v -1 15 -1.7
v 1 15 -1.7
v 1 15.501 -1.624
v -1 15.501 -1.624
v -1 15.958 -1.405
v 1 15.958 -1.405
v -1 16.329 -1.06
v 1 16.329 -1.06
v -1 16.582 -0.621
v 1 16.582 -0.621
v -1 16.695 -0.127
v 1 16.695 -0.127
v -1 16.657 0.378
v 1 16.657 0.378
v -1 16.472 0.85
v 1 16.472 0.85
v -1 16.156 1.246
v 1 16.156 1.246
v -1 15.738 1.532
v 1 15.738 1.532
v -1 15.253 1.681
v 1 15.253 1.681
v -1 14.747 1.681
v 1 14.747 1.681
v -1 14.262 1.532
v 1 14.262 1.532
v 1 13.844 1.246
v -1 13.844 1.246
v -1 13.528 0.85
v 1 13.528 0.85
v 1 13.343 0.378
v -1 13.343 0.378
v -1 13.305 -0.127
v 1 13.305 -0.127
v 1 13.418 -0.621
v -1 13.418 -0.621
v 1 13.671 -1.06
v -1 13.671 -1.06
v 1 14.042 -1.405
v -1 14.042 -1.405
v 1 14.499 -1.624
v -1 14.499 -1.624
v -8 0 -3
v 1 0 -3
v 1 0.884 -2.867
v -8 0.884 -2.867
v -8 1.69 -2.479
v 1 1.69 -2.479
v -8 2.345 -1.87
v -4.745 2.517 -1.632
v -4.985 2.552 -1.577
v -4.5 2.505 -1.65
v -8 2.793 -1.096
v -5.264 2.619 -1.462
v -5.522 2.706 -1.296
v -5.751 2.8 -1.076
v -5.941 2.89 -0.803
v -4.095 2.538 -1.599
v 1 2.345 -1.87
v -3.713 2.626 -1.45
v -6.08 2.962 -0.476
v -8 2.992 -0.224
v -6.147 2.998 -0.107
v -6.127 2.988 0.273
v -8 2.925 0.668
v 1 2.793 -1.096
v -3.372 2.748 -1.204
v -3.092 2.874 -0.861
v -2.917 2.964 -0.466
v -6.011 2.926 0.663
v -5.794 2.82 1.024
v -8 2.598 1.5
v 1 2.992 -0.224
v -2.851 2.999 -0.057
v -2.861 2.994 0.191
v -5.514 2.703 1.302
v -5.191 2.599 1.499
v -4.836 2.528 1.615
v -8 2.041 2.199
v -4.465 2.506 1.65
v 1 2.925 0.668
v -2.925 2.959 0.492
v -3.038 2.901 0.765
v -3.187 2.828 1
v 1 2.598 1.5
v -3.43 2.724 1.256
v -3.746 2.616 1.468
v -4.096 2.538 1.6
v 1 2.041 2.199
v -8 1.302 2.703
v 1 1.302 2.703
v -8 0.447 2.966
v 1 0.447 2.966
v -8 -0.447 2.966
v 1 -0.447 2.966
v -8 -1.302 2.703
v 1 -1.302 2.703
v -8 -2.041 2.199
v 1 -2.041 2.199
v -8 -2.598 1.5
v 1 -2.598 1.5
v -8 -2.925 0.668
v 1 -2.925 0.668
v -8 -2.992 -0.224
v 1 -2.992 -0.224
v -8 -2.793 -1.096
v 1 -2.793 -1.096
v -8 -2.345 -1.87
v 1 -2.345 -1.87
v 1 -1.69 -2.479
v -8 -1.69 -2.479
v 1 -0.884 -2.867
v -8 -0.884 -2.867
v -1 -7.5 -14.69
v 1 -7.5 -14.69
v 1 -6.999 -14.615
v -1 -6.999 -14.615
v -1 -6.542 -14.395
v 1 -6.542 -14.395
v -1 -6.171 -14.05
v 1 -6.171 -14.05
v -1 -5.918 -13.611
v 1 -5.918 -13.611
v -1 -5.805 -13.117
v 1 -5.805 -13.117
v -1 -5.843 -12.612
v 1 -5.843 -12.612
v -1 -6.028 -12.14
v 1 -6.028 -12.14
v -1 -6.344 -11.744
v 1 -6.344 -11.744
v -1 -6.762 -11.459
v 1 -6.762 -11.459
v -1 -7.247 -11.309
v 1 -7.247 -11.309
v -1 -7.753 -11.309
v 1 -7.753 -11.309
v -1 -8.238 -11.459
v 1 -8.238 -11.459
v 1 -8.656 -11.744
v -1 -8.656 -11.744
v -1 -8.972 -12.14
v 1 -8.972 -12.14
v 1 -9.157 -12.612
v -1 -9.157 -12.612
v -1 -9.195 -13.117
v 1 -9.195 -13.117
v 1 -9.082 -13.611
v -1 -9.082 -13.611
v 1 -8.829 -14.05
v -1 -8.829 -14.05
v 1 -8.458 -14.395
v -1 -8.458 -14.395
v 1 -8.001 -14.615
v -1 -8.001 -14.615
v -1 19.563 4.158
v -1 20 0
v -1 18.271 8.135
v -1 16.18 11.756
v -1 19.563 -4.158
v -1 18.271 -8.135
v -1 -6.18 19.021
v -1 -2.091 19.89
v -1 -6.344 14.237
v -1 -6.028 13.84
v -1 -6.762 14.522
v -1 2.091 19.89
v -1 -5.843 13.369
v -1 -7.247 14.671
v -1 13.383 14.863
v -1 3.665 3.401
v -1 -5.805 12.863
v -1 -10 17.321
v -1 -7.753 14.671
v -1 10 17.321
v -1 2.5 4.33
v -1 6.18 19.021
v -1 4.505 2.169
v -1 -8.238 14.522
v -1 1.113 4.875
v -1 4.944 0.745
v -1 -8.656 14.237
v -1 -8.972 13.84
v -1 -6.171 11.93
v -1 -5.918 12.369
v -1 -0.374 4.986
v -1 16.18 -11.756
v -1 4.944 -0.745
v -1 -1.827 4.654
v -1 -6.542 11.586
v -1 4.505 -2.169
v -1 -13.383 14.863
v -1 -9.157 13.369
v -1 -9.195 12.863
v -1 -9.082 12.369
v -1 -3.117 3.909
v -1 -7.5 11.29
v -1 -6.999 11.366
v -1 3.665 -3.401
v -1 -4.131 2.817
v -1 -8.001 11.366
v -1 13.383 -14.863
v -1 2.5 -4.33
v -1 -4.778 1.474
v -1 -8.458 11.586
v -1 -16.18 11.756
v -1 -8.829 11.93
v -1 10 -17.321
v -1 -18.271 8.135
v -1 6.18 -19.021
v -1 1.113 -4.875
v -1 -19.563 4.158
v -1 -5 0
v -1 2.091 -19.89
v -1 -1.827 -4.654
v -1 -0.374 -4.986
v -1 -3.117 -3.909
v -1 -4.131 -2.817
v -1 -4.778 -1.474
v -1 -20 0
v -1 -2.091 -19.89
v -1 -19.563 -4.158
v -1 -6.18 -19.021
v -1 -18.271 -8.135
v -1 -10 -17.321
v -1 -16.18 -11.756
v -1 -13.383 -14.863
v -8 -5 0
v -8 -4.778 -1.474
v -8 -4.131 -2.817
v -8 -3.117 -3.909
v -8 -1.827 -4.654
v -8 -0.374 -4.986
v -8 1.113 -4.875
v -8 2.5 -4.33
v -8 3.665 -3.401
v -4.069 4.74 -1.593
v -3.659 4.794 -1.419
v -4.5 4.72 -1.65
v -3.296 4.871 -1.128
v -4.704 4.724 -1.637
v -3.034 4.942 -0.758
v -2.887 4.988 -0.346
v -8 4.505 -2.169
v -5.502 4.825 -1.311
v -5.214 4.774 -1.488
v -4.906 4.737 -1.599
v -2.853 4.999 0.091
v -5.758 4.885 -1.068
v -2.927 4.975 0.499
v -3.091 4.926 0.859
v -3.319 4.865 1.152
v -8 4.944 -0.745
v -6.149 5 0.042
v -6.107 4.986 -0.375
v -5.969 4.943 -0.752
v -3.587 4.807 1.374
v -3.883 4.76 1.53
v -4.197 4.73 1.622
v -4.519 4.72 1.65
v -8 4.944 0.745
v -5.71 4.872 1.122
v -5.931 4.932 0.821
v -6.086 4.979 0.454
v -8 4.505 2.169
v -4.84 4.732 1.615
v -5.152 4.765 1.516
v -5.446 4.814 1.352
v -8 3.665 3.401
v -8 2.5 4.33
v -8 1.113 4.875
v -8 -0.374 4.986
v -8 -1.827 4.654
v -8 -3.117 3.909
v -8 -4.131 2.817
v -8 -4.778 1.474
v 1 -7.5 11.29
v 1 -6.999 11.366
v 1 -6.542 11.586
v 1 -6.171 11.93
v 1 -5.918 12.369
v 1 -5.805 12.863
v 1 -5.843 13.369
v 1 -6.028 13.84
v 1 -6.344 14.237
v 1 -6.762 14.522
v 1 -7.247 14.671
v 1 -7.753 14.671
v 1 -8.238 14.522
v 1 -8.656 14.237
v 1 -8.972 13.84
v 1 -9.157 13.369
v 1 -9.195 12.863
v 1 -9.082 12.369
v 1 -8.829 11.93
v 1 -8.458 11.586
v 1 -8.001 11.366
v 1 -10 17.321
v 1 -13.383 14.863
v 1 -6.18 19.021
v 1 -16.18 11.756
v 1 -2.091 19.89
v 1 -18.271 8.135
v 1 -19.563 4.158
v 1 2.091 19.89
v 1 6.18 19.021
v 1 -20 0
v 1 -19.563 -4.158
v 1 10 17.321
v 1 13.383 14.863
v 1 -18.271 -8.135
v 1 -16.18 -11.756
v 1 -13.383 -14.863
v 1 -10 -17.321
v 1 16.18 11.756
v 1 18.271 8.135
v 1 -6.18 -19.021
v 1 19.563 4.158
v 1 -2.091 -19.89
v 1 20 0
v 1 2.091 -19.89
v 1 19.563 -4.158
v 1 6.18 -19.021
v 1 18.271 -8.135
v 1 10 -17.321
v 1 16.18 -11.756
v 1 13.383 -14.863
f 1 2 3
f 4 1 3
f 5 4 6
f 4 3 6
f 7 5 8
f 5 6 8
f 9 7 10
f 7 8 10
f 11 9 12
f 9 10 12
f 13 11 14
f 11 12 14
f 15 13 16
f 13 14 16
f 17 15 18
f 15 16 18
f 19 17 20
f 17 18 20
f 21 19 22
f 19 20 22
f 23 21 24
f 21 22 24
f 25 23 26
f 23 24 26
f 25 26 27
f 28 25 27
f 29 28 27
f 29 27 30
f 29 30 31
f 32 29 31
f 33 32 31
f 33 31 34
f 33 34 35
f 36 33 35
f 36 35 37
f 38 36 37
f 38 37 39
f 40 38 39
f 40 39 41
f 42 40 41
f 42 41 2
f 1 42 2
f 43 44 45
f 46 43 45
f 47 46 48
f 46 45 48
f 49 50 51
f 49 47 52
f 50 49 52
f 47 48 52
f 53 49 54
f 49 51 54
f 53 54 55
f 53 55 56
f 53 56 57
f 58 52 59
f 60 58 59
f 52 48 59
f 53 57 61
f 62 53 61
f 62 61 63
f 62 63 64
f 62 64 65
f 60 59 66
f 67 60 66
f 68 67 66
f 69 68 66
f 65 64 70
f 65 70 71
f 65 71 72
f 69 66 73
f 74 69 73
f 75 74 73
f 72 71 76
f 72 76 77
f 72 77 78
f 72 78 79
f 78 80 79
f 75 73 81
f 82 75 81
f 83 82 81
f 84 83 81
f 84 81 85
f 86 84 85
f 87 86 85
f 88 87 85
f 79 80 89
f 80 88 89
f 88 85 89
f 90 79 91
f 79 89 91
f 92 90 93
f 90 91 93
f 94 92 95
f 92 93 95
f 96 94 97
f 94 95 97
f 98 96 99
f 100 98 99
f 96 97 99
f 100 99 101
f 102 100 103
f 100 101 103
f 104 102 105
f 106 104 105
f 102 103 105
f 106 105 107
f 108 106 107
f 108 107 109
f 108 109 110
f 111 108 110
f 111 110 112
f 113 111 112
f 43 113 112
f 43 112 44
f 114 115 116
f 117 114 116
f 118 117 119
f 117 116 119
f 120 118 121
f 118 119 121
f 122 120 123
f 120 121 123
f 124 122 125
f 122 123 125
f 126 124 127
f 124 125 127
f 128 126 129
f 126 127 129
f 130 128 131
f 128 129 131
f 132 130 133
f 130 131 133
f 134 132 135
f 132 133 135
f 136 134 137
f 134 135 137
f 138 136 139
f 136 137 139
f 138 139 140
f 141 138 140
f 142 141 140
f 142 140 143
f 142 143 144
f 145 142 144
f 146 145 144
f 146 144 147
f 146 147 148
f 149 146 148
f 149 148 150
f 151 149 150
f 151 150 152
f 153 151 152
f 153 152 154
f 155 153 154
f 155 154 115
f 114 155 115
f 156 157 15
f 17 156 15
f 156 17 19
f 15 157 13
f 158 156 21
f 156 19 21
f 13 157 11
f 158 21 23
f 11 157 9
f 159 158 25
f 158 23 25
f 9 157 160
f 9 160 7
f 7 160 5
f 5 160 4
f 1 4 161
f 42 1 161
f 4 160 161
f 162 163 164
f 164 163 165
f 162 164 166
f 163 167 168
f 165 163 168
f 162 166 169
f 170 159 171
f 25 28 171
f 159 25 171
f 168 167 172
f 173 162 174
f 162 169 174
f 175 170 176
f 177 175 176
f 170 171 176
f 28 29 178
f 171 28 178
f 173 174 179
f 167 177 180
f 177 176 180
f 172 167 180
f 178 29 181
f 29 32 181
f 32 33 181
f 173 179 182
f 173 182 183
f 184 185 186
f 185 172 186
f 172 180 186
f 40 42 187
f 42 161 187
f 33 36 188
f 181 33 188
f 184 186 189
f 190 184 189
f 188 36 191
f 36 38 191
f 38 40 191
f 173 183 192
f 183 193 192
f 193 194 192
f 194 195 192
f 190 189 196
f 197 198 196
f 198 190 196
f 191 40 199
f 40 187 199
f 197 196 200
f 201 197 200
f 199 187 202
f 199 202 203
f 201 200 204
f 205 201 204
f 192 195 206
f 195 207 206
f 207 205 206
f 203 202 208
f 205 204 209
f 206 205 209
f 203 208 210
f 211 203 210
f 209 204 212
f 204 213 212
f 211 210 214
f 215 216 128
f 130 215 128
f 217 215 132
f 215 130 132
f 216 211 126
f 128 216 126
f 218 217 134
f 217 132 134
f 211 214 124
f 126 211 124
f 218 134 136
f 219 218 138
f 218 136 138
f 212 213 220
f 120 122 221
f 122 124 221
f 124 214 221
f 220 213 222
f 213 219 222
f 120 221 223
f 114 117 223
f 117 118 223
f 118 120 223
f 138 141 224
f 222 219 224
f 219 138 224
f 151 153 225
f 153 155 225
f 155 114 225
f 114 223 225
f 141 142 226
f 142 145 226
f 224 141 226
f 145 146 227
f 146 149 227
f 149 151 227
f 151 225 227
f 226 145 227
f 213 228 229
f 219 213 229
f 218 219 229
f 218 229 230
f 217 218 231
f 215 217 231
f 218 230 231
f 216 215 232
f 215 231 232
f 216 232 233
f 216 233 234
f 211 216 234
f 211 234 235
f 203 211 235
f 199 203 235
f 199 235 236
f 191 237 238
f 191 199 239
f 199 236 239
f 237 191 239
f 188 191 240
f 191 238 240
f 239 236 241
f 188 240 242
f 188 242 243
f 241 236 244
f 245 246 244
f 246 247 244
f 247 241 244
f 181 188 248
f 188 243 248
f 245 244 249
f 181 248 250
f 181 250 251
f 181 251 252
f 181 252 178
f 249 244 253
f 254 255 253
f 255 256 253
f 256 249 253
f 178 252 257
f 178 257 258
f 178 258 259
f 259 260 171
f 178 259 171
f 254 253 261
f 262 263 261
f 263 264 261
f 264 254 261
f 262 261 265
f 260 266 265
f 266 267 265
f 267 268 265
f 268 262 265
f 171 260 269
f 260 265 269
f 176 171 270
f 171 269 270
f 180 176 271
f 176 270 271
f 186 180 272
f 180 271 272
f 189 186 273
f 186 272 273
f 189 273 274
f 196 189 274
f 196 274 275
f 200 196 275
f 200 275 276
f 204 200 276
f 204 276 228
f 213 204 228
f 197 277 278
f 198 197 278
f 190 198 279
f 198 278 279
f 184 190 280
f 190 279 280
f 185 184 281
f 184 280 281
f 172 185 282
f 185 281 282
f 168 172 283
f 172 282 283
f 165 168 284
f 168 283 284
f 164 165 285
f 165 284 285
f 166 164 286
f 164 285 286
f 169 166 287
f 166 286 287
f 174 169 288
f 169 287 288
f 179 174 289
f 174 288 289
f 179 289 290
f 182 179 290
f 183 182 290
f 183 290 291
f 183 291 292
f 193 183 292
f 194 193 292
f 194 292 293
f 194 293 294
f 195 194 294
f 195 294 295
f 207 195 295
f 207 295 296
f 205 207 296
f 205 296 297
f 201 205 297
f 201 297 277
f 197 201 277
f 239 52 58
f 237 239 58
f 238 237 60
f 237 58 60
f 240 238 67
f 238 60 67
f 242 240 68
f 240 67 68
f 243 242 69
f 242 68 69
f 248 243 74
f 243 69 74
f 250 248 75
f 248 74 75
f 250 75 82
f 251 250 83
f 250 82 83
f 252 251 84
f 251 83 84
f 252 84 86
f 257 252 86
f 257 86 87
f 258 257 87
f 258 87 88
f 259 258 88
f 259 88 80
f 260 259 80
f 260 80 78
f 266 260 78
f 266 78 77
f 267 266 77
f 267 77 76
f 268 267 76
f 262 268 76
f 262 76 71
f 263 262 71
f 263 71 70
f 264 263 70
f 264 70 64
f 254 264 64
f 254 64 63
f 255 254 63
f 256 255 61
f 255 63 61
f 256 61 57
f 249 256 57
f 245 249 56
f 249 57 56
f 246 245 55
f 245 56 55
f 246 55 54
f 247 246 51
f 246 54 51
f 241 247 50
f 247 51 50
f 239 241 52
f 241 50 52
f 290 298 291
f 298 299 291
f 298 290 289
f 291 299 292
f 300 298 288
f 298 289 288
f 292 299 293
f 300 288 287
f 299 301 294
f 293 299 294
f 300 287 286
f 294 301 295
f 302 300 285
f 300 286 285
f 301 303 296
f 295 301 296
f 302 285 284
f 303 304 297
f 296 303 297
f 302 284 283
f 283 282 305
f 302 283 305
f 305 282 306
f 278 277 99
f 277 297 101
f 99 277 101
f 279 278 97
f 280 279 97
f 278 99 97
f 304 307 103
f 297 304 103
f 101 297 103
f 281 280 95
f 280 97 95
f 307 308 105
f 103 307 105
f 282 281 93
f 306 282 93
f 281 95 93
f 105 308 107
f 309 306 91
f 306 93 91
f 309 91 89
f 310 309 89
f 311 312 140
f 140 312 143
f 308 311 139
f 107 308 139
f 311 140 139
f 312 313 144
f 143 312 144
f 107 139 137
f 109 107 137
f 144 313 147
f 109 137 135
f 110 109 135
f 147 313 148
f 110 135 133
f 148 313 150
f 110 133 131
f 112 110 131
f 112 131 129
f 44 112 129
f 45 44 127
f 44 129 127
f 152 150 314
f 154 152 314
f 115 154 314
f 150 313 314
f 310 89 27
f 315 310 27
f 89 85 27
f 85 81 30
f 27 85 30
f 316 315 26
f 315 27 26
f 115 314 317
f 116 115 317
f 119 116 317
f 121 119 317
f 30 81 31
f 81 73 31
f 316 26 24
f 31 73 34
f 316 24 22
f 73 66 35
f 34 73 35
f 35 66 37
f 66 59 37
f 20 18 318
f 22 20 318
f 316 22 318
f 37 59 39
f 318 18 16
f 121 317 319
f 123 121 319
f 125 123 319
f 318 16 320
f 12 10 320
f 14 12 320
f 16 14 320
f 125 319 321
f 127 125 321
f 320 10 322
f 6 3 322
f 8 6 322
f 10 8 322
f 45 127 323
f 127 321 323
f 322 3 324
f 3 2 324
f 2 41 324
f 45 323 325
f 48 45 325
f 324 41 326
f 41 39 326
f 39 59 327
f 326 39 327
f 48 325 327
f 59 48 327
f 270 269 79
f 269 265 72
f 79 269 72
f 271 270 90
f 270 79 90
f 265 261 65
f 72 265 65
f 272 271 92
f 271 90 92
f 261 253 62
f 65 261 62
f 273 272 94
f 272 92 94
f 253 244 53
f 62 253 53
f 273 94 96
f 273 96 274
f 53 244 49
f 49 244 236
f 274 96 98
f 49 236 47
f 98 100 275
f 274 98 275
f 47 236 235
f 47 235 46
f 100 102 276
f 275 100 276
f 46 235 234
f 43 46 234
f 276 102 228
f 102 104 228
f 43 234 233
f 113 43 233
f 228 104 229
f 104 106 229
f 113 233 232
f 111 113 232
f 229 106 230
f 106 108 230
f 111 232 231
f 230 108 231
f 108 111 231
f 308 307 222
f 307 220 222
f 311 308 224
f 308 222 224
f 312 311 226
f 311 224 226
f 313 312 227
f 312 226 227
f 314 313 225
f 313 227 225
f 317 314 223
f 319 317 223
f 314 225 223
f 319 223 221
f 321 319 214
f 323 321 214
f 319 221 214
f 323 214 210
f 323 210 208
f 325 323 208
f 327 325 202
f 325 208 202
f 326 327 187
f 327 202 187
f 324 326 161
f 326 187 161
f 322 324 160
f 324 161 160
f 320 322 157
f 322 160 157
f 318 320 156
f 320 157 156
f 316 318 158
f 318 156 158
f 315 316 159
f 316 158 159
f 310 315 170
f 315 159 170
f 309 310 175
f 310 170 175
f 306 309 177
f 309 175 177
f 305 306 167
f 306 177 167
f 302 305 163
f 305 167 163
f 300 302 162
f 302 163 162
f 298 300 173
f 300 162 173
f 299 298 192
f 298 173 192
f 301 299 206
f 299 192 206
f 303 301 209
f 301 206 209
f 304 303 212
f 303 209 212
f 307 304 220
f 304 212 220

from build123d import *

# Parameters (mm, degrees)
DIAM_TRE_DU_PER_AGE_6_0_6_1_D = 6
TROU_TARAUD_M4X0_71_D         = 3.3
TROU_TARAUD_M4X0_71_DEPTH     = 4
TROU_TARAUD_M4X0_71_TIP       = 0.991420021
D_GAGEMENT_M31_D              = 3.4


with BuildPart() as part:
    # Esquisse1 → Révolution1 (revolve)
    with BuildSketch(Plane.XY, mode=Mode.PRIVATE) as r_volution1_sk:
        Polygon((-1, 0), (1, 0), (1, 20), (-1, 20), (-1, 5), (-8, 5), (-8, 0), align=None)
    revolve(r_volution1_sk.sketch.rotate(Axis((-1031.231063335, 0, 0), (1, 0, 0)), 180), axis=Axis((-1031.231063335, 0, 0), (1, 0, 0)))

    # Diamètre du perçage Ø6.0 (6)1 (through all)
    with Locations(Plane.ZY.offset(8)):
        with Locations((0, 0)):
            Hole(DIAM_TRE_DU_PER_AGE_6_0_6_1_D / 2)

    # Trou taraudé M4x0.71
    with Locations(Plane(origin=(-4.5, 5, 0), x_dir=(0, 0, 1), z_dir=(0, 1, 0))):
        with Locations((0, 0)):
            Hole(TROU_TARAUD_M4X0_71_D / 2, depth=TROU_TARAUD_M4X0_71_DEPTH)
            with Locations((0, 0, -(TROU_TARAUD_M4X0_71_DEPTH + TROU_TARAUD_M4X0_71_TIP / 2))):  # 118° drill point
                Cone(0, TROU_TARAUD_M4X0_71_D / 2, TROU_TARAUD_M4X0_71_TIP, mode=Mode.SUBTRACT)

    # Dégagement M31 (through all)
    with Locations(Plane.ZY.offset(1)):
        with Locations((0, 15), (12.990381057, -7.5), (-12.990381057, -7.5)):
            Hole(D_GAGEMENT_M31_D / 2)


solid = part.part
